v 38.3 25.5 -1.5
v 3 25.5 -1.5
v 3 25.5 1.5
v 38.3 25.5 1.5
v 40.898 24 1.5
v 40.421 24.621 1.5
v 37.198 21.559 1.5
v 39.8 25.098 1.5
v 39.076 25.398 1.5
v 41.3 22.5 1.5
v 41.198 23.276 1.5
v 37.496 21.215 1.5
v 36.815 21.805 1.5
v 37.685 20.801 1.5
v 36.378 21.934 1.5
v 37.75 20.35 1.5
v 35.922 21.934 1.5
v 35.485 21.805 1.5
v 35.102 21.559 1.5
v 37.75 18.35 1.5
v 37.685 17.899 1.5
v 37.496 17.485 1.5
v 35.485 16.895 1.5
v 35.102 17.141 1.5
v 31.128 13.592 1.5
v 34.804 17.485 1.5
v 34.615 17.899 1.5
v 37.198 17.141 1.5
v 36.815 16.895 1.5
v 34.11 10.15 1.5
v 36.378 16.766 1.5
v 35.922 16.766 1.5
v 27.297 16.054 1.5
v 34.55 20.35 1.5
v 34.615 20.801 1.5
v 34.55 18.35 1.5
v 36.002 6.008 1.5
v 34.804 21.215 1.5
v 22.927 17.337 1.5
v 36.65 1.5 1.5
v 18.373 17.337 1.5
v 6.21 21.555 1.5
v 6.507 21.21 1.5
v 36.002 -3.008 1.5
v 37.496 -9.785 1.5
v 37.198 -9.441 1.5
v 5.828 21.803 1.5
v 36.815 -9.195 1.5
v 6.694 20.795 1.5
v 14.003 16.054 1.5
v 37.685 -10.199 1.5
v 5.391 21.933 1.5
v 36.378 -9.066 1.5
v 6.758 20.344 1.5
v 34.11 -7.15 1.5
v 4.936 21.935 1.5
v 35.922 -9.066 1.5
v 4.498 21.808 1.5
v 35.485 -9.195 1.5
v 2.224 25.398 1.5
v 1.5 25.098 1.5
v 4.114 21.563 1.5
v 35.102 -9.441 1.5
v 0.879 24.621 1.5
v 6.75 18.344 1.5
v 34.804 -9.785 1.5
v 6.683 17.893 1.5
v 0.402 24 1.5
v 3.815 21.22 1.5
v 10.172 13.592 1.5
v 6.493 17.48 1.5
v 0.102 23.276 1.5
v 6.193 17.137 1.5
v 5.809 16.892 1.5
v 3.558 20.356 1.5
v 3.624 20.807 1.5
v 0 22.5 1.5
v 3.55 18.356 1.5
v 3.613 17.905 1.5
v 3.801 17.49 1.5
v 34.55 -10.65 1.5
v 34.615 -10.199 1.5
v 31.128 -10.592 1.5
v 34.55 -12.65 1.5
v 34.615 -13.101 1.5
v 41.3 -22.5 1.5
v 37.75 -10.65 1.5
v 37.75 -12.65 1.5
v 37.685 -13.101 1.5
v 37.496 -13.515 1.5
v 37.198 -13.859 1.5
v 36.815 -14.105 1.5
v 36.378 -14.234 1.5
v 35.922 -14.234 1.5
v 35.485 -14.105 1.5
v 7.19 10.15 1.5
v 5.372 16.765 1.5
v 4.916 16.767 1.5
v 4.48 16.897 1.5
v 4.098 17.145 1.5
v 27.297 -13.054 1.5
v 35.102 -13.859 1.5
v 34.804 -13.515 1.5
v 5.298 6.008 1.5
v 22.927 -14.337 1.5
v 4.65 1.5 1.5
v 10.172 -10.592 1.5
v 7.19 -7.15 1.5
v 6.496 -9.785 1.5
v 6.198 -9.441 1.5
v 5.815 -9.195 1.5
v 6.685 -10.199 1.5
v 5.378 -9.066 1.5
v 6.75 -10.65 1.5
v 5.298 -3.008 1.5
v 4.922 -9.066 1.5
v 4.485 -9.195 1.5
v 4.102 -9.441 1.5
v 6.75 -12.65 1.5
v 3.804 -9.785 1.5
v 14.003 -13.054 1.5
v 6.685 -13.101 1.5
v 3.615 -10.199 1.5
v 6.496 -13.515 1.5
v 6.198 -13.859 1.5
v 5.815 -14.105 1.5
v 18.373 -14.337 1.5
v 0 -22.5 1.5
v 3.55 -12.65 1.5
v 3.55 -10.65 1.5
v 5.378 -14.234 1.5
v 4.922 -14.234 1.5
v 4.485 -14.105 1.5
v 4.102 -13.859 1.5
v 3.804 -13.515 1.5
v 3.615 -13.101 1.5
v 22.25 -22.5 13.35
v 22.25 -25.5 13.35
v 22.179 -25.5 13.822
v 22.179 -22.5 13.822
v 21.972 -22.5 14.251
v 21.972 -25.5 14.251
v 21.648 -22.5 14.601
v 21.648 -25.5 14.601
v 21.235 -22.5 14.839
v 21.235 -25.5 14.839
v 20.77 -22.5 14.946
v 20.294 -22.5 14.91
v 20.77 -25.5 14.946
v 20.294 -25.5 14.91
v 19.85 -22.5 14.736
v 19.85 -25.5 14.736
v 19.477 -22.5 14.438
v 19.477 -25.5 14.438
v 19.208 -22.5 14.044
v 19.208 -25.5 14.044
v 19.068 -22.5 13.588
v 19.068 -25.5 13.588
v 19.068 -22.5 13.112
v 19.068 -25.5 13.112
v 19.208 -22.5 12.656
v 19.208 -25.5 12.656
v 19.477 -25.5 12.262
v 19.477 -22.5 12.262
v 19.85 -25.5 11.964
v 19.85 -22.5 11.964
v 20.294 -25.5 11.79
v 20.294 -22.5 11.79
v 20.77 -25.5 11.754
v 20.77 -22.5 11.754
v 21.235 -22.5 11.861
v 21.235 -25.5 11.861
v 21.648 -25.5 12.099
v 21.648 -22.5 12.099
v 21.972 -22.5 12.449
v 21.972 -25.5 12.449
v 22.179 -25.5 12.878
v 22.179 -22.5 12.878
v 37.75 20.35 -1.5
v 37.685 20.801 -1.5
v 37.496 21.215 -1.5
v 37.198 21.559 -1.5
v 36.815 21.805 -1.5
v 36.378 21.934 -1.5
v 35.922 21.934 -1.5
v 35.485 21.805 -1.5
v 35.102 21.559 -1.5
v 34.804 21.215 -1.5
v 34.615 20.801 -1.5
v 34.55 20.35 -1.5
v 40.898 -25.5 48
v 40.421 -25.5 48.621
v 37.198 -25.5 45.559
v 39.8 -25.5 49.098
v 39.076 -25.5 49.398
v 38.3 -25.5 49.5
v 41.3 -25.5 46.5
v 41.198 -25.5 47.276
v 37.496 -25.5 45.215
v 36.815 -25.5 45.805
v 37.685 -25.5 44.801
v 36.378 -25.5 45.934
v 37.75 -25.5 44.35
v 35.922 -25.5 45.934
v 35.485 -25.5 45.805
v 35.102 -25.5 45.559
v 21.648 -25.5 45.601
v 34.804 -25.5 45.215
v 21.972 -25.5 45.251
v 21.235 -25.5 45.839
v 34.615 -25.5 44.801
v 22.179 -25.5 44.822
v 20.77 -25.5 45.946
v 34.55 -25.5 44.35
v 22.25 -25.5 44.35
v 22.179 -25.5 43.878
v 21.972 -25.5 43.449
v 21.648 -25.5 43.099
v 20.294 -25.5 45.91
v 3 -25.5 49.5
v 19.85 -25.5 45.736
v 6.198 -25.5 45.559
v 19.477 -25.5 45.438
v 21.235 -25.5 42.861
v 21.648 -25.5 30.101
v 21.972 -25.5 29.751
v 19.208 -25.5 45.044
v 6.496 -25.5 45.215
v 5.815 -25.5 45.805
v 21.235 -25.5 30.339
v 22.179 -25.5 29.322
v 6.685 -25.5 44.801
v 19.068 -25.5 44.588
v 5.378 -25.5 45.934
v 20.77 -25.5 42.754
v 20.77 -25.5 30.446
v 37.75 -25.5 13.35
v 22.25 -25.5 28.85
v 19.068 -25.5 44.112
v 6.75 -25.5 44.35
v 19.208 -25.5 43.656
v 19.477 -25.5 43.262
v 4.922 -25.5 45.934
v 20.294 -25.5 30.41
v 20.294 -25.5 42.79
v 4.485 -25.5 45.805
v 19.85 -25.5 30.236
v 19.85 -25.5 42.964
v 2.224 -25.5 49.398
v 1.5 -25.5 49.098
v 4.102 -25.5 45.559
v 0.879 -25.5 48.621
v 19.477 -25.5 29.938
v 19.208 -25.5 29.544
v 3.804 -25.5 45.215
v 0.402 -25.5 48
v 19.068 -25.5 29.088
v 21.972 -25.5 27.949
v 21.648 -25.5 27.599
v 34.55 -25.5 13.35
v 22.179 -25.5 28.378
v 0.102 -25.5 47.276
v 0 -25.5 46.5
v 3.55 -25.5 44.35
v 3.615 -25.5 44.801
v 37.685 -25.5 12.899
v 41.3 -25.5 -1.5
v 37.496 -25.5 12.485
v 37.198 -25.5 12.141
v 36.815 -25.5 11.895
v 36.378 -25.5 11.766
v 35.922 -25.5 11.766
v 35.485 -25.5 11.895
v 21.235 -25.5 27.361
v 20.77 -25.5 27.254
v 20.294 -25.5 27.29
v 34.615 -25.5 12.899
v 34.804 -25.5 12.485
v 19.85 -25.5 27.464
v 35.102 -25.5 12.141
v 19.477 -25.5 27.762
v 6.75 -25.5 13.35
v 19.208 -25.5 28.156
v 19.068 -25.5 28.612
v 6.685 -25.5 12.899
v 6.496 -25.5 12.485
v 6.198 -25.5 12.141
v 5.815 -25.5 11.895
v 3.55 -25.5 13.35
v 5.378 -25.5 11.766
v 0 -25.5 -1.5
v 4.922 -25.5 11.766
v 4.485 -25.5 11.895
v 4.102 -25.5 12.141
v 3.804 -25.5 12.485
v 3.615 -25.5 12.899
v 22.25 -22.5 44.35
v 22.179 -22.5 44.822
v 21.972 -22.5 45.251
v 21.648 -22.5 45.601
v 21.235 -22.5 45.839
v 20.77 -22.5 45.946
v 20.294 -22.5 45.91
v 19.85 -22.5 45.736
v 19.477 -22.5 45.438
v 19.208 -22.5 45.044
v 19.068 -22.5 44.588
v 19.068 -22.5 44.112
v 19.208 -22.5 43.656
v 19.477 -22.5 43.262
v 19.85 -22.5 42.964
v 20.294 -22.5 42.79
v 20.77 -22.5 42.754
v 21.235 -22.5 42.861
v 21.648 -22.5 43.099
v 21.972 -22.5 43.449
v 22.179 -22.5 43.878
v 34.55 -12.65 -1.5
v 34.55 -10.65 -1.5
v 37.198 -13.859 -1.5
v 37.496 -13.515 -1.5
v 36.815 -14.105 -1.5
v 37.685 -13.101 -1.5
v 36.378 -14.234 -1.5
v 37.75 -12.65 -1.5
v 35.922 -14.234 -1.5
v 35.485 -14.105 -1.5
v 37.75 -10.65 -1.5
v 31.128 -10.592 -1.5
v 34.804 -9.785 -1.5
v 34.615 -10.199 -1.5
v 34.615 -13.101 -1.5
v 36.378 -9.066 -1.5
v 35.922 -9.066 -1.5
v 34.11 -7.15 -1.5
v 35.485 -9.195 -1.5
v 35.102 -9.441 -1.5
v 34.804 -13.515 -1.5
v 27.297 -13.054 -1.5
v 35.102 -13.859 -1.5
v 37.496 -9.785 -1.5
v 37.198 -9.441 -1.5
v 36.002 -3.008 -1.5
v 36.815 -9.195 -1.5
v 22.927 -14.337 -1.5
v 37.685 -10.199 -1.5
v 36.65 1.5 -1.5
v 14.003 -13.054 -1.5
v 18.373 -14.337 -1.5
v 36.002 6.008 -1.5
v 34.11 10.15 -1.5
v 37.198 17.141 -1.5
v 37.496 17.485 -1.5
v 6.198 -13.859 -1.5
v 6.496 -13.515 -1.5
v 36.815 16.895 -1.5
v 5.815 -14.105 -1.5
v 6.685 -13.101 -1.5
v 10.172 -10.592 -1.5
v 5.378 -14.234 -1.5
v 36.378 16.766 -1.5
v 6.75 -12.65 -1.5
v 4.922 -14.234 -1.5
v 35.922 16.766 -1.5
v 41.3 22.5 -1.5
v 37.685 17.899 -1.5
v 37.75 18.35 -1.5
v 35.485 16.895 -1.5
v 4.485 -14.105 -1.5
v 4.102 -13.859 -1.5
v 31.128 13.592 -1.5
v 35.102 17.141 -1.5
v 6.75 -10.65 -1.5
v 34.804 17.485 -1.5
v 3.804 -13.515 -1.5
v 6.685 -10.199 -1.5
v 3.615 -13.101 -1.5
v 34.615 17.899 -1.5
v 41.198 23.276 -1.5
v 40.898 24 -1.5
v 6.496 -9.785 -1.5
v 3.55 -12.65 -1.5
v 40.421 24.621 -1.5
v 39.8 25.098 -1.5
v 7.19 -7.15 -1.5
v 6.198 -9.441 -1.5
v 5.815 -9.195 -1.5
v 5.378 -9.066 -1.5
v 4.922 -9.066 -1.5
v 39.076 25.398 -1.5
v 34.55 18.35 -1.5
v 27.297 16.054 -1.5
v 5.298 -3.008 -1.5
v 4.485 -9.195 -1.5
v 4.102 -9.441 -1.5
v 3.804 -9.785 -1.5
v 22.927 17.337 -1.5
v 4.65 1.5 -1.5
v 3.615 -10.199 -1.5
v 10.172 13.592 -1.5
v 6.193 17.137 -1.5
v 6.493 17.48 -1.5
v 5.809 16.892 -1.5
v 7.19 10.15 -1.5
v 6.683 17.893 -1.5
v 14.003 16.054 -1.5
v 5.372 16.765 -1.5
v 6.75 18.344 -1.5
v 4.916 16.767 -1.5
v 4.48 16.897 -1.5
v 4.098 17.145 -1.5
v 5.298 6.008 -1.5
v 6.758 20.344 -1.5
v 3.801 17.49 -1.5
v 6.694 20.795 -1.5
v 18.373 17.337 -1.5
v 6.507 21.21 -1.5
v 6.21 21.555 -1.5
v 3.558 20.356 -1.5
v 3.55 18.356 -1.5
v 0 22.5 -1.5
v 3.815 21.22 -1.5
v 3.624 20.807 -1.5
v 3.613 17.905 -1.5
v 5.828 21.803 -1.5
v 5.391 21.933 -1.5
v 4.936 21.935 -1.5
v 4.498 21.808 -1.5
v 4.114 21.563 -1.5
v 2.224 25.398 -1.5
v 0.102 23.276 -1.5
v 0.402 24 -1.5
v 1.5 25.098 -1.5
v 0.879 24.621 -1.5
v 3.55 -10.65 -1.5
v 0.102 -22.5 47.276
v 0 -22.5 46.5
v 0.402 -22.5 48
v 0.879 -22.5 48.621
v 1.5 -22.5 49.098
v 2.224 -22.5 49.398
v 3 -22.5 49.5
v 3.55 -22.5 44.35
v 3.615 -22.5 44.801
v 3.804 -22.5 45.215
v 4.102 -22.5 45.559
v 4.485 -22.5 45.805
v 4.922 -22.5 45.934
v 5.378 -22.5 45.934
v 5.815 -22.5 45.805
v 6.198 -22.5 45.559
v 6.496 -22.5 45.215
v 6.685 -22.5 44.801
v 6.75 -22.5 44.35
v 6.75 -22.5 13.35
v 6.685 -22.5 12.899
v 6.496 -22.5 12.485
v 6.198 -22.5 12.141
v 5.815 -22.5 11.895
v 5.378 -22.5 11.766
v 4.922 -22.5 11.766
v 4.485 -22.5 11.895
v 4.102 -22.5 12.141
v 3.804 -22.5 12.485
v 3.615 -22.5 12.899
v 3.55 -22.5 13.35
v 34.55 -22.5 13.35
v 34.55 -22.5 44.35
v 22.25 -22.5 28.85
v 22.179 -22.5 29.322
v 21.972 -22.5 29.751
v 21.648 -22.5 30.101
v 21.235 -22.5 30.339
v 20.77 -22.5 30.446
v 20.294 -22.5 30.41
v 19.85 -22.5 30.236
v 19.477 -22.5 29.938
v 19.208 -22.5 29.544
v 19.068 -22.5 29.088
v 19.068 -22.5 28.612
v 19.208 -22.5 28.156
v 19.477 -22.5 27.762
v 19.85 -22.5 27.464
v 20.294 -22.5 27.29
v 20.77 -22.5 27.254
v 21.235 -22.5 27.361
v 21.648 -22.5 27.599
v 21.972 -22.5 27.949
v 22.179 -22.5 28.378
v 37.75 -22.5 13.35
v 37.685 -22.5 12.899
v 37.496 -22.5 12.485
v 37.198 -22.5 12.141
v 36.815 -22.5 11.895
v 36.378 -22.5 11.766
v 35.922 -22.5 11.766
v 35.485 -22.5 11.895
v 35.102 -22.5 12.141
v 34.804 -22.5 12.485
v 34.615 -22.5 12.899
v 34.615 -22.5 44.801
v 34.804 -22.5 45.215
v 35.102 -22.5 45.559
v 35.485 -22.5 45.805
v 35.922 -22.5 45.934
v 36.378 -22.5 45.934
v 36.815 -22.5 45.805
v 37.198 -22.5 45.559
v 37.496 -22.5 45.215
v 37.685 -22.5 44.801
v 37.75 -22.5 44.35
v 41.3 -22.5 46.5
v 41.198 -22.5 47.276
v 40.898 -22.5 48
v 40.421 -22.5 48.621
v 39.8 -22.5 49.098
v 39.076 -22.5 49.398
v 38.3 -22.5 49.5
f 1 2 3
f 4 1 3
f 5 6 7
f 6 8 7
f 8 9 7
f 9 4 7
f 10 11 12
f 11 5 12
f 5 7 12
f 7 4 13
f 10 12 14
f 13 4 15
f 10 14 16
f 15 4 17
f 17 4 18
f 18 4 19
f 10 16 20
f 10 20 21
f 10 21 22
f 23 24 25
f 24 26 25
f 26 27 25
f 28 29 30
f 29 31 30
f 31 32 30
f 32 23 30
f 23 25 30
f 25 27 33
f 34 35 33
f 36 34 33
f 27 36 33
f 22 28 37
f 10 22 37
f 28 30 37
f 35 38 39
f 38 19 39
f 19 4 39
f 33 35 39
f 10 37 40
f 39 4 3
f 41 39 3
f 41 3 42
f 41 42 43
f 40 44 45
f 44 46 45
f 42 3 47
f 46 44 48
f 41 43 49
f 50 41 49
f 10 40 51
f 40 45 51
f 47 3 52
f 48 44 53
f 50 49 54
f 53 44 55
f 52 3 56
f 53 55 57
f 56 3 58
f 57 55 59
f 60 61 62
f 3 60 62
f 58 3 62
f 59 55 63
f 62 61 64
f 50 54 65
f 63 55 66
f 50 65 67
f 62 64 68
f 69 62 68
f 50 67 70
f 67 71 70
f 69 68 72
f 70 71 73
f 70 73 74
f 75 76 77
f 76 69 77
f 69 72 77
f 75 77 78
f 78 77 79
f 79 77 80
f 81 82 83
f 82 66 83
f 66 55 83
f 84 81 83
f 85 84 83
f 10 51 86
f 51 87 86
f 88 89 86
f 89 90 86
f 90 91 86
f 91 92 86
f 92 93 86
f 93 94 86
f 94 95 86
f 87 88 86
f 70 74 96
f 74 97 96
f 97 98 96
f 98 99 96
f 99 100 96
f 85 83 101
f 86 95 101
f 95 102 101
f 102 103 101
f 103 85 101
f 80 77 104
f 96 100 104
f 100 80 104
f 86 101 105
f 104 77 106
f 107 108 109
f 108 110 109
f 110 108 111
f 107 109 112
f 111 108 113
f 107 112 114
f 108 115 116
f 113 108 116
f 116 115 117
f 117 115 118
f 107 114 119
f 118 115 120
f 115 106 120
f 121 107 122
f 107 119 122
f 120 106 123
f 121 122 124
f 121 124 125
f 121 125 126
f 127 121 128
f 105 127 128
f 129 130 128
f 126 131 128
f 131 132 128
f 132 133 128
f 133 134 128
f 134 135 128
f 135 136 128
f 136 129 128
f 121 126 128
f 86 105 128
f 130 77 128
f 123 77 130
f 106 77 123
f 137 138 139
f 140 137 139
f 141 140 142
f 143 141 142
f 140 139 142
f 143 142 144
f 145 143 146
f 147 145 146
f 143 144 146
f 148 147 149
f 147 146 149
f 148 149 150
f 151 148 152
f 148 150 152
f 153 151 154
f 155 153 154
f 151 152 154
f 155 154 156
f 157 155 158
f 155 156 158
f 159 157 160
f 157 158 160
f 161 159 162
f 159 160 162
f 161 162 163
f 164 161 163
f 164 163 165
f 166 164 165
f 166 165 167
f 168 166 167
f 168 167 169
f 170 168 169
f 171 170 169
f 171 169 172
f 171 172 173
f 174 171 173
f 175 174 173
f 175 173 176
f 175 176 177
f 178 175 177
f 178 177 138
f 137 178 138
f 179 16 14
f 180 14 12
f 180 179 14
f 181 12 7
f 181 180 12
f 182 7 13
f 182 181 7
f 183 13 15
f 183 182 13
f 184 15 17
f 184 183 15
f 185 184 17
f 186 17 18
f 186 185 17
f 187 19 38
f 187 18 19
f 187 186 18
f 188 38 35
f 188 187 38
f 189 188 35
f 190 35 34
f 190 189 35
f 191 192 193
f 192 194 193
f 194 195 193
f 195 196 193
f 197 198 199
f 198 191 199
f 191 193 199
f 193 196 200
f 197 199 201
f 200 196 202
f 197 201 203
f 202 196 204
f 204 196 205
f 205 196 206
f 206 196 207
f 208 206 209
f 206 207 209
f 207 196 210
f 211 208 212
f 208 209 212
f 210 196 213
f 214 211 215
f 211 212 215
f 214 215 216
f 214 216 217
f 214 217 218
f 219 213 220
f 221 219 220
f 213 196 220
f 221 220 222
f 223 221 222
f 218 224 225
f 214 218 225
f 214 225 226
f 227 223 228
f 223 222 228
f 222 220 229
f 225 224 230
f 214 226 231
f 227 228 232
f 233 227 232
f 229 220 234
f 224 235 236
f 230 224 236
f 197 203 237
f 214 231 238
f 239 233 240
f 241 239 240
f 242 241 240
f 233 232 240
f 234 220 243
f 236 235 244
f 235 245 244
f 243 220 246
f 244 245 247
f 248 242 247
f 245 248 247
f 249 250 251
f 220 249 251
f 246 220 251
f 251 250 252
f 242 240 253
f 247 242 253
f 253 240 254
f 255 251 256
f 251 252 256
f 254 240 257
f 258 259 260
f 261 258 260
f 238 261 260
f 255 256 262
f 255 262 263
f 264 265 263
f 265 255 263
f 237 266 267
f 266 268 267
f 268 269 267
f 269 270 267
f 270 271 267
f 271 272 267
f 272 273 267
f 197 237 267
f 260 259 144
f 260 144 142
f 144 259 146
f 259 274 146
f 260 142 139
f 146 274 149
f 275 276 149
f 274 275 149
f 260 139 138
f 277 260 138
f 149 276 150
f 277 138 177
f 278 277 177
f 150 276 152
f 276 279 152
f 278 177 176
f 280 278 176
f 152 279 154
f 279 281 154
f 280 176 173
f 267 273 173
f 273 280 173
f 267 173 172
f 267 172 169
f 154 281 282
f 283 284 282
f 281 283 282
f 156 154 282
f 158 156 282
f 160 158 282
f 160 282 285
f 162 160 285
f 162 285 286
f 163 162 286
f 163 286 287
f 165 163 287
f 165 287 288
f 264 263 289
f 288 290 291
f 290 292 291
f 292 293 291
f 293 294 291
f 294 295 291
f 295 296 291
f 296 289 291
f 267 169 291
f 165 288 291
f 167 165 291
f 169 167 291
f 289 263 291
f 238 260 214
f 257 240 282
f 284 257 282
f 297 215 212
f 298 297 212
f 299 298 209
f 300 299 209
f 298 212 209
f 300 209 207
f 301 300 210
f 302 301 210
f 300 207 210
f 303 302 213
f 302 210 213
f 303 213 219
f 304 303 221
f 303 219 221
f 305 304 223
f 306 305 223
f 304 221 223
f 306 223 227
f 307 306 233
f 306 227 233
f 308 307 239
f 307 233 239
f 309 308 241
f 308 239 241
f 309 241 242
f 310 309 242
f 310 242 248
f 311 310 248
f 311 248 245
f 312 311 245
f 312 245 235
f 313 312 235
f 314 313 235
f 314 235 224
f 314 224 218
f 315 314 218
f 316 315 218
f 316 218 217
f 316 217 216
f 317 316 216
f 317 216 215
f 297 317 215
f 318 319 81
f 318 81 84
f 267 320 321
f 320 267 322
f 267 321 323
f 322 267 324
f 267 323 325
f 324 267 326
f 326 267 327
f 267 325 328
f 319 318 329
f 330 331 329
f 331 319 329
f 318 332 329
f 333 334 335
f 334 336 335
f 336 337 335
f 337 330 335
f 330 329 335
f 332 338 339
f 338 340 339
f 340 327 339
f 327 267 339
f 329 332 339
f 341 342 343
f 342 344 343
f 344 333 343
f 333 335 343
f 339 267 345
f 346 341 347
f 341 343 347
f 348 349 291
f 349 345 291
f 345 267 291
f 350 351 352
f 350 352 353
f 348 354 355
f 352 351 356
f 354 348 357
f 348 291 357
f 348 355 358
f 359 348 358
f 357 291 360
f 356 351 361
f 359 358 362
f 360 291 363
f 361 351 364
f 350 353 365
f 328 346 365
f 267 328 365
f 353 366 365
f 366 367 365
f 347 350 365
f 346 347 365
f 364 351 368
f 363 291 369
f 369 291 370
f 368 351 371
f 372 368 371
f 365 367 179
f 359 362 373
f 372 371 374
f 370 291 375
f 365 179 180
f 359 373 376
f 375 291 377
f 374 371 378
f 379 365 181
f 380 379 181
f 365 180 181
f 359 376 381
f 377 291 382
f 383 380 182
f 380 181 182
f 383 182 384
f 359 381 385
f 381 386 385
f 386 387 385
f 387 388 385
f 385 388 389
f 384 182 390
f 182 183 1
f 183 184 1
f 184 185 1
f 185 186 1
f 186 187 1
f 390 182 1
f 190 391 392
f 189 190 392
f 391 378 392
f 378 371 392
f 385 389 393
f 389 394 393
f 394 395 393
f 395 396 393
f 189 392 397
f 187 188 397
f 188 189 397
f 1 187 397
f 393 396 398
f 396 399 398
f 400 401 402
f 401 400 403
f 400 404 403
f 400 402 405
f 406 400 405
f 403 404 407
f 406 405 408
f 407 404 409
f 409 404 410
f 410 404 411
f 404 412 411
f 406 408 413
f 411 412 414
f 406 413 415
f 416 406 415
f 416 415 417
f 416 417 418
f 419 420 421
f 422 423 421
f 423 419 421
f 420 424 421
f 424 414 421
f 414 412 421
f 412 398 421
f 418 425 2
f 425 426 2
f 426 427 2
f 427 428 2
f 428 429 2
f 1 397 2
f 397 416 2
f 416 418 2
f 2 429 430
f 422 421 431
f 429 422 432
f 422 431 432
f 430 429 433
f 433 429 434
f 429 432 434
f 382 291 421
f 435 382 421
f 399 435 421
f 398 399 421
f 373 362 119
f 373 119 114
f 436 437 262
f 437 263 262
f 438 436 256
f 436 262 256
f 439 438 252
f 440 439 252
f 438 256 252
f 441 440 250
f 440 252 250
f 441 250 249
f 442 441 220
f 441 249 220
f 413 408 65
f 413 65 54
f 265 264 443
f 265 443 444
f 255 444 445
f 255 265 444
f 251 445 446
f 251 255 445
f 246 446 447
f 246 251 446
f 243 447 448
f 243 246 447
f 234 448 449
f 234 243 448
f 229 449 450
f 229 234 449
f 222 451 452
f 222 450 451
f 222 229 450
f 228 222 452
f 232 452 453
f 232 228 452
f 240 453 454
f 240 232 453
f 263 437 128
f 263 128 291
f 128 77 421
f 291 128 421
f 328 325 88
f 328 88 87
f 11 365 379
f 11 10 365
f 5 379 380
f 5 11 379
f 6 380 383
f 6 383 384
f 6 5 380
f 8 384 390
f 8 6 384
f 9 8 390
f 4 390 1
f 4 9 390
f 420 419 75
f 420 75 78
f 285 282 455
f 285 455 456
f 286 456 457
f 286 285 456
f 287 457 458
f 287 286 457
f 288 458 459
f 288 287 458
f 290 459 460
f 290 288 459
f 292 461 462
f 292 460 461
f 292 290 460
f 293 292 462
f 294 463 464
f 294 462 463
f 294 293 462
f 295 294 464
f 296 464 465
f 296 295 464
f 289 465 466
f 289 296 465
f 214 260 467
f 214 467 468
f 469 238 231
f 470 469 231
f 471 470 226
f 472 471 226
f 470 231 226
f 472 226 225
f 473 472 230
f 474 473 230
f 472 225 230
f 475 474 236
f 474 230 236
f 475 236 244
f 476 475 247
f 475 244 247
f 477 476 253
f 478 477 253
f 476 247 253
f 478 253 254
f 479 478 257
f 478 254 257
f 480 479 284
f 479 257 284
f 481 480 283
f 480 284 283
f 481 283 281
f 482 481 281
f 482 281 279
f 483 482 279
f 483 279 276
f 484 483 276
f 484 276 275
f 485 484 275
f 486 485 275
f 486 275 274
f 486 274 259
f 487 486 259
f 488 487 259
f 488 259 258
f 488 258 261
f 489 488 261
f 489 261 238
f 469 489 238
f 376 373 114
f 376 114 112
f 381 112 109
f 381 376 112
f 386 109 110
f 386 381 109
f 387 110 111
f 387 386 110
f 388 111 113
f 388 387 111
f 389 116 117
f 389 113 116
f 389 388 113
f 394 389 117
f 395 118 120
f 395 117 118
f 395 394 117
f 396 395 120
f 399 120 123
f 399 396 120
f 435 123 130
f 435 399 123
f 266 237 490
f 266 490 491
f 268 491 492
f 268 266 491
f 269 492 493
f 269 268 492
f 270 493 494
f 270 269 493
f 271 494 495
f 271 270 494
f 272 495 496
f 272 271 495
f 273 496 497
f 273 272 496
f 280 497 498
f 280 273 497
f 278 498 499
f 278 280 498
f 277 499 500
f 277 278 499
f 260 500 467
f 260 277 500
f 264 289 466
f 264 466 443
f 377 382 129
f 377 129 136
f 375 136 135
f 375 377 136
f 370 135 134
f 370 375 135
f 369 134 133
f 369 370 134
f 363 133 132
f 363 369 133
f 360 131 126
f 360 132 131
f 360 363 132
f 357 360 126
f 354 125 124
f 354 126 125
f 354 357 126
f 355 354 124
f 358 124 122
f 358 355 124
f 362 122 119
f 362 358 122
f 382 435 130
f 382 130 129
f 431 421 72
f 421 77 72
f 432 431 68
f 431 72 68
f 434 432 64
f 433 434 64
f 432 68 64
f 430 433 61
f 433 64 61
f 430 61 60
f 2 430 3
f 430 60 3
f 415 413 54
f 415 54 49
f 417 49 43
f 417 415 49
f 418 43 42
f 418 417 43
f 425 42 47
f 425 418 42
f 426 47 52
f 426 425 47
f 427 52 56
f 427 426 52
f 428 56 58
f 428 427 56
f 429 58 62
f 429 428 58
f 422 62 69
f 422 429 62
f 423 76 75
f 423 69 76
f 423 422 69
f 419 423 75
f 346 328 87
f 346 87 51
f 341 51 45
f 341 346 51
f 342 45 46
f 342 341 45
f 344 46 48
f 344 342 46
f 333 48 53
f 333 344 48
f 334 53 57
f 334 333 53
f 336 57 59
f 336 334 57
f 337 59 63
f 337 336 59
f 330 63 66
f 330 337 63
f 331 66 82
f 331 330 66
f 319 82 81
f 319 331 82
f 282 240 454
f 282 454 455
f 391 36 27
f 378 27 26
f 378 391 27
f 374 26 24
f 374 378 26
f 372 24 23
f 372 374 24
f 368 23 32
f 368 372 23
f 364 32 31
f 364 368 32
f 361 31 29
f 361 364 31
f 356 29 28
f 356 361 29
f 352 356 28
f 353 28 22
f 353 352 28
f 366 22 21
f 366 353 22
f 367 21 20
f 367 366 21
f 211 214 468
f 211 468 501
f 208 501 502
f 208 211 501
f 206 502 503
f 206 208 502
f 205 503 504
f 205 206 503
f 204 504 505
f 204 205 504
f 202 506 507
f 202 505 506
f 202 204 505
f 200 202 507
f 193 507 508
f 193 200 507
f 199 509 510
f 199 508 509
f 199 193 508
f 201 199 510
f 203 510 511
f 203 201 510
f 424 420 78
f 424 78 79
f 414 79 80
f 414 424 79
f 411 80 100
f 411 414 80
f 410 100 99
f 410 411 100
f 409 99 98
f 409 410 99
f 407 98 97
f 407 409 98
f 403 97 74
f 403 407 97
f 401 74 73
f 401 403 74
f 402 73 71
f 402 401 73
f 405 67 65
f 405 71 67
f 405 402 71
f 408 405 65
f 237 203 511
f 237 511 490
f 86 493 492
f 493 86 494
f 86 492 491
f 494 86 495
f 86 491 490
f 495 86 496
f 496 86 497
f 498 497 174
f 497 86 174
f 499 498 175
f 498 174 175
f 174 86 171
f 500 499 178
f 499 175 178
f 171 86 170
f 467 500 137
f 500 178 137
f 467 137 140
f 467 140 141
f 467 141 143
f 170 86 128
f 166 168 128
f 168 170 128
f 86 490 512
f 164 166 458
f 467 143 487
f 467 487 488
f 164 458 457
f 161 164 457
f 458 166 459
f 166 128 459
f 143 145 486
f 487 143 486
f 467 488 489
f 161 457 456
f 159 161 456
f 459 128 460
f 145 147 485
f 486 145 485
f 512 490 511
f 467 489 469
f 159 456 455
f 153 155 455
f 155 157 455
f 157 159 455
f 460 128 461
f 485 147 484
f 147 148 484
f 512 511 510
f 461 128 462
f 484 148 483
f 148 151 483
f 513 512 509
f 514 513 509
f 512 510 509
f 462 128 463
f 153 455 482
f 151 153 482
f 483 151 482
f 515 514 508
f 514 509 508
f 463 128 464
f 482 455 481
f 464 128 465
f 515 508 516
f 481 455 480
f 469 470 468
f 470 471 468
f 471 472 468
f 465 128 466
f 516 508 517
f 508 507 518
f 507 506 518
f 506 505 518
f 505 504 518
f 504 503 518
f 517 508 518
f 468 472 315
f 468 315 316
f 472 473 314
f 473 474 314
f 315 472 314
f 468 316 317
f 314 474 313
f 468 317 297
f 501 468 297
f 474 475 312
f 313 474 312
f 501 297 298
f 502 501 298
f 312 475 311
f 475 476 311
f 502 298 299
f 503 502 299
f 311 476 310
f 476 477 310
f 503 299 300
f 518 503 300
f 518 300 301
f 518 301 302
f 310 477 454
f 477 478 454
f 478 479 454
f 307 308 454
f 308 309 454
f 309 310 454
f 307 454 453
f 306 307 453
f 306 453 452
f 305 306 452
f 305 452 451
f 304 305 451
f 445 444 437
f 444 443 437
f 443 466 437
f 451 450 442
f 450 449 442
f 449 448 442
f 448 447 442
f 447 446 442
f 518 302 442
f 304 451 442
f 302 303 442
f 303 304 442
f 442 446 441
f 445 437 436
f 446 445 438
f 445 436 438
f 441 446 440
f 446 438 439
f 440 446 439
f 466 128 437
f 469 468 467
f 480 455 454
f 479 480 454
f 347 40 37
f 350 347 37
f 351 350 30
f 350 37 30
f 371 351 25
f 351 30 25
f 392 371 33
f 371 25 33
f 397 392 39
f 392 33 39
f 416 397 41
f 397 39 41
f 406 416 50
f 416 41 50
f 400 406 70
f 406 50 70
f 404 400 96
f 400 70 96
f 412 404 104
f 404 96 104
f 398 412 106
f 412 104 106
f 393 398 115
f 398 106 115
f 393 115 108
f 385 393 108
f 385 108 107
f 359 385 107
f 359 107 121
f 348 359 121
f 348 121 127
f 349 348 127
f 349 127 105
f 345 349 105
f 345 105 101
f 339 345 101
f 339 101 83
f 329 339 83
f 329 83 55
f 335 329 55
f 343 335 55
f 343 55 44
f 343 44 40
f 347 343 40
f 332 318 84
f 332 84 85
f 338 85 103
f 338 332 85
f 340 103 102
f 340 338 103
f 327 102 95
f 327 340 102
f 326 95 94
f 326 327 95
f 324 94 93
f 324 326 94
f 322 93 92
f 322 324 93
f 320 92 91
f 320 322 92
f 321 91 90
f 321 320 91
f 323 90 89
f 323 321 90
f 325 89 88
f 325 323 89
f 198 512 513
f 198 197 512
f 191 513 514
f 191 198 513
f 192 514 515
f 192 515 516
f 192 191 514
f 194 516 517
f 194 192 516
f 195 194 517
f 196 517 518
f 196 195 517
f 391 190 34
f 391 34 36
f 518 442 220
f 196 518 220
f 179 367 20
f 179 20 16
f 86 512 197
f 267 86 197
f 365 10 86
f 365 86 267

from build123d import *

# Parameters (mm, degrees)
BOSS_EXTRUDE1_DEPTH = 41.3
SKETCH2_R           = 16
CUT_EXTRUDE2_DEPTH  = 41.3
CUT_EXTRUDE7_DEPTH  = 41.3
SKETCH8_R           = 1.6
CUT_EXTRUDE8_DEPTH  = 41.3
FILLET1_R           = 3


with BuildPart() as part:
    # Sketch1 → Boss-Extrude1 (new body)
    with BuildSketch(Plane(origin=(0, 0, 0), x_dir=(0, 0, -1), z_dir=(1, 0, 0))):
        Polygon((-1.5, -22.5), (-49.5, -22.5), (-49.5, -25.5), (1.5, -25.5), (1.5, -22.5), (1.5, 25.5), (-1.5, 25.5), align=None)
    extrude(amount=BOSS_EXTRUDE1_DEPTH)

    # Sketch2 → Cut-Extrude2 (cut)
    with BuildSketch(Plane.XY.offset(1.5)):
        with Locations((20.65, 1.5)):
            Circle(SKETCH2_R)
    extrude(amount=-CUT_EXTRUDE2_DEPTH, mode=Mode.SUBTRACT)

    # Sketch4 → Cut-Extrude7 (cut)
    with BuildSketch(Plane(origin=(0, 0, -1.5), x_dir=(-1, 0, 0), z_dir=(0, 0, -1))):
        with BuildLine():
            Line((-3.557549808, 20.356030754), (-3.550011366, 18.356044961))
            ThreePointArc((-3.550011366, 18.356044961), (-5.143969246, 16.750025573), (-6.749988634, 18.343983453))
            Line((-6.749988634, 18.343983453), (-6.757527076, 20.343969246))
            ThreePointArc((-6.757527076, 20.343969246), (-5.163569196, 21.949988634), (-3.557549808, 20.356030754))
        make_face()
        with BuildLine():
            Line((-34.55, 20.35), (-34.55, 18.35))
            ThreePointArc((-34.55, 18.35), (-36.15, 16.75), (-37.75, 18.35))
            Line((-37.75, 18.35), (-37.75, 20.35))
            ThreePointArc((-37.75, 20.35), (-36.15, 21.95), (-34.55, 20.35))
        make_face()
        with BuildLine():
            Line((-3.55, -10.65), (-3.55, -12.65))
            ThreePointArc((-3.55, -12.65), (-5.15, -14.25), (-6.75, -12.65))
            Line((-6.75, -12.65), (-6.75, -10.65))
            ThreePointArc((-6.75, -10.65), (-5.15, -9.05), (-3.55, -10.65))
        make_face()
        with BuildLine():
            Line((-34.55, -10.65), (-34.55, -12.65))
            ThreePointArc((-34.55, -12.65), (-36.15, -14.25), (-37.75, -12.65))
            Line((-37.75, -12.65), (-37.75, -10.65))
            ThreePointArc((-37.75, -10.65), (-36.15, -9.05), (-34.55, -10.65))
        make_face()
    extrude(amount=-CUT_EXTRUDE7_DEPTH, mode=Mode.SUBTRACT)

    # Sketch8 → Cut-Extrude8 (cut)
    with BuildSketch(Plane.XZ.offset(25.5)):
        with Locations((20.65, 44.35)):
            Circle(SKETCH8_R)
        with Locations((20.65, 13.35)):
            Circle(SKETCH8_R)
        with Locations((20.65, 28.85)):
            Circle(SKETCH8_R)
        with BuildLine():
            Line((37.75, 44.35), (37.75, 13.35))
            ThreePointArc((37.75, 13.35), (36.15, 11.75), (34.55, 13.35))
            Line((34.55, 13.35), (34.55, 44.35))
            ThreePointArc((34.55, 44.35), (36.15, 45.95), (37.75, 44.35))
        make_face()
        with BuildLine():
            Line((6.75, 44.35), (6.75, 13.35))
            ThreePointArc((6.75, 13.35), (5.15, 11.75), (3.55, 13.35))
            Line((3.55, 13.35), (3.55, 44.35))
            ThreePointArc((3.55, 44.35), (5.15, 45.95), (6.75, 44.35))
        make_face()
    extrude(amount=-CUT_EXTRUDE8_DEPTH, mode=Mode.SUBTRACT)

    # Fillet1
    fillet1_edges = [part.edges().sort_by_distance(p)[0] for p in [
        (41.3, 25.5, 0),
        (41.3, -24, 49.5),
        (0, -24, 49.5),
        (0, 25.5, 0),
    ]]
    fillet(fillet1_edges, radius=FILLET1_R)


solid = part.part
